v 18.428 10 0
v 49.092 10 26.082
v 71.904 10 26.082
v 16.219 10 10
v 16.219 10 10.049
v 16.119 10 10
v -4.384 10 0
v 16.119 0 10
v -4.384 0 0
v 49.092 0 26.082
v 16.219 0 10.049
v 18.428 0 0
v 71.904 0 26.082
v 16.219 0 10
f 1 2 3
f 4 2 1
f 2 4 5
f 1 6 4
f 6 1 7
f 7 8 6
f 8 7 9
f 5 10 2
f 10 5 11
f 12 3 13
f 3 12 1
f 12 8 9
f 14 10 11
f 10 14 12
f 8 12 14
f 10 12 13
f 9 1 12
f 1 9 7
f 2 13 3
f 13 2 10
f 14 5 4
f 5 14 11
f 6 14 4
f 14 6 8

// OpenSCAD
angle = 64;
difference() {
translate([0, 0, -sin(angle) * 10])
rotate([0, -(90-angle), 0])
cube(size=[80, 10, 10]);
    translate([-5, -1, -10])
    cube(size=[80, 12, 10]);

translate([0, -1, sin(90-angle) * 80 - sin(angle) * 10])
    cube(size=[80, 12, 10]);


translate([-sin(90 - angle) * 10 + tan(angle) * 10, 0, 10])
cube(size=[.1, 10, 20]);
}
